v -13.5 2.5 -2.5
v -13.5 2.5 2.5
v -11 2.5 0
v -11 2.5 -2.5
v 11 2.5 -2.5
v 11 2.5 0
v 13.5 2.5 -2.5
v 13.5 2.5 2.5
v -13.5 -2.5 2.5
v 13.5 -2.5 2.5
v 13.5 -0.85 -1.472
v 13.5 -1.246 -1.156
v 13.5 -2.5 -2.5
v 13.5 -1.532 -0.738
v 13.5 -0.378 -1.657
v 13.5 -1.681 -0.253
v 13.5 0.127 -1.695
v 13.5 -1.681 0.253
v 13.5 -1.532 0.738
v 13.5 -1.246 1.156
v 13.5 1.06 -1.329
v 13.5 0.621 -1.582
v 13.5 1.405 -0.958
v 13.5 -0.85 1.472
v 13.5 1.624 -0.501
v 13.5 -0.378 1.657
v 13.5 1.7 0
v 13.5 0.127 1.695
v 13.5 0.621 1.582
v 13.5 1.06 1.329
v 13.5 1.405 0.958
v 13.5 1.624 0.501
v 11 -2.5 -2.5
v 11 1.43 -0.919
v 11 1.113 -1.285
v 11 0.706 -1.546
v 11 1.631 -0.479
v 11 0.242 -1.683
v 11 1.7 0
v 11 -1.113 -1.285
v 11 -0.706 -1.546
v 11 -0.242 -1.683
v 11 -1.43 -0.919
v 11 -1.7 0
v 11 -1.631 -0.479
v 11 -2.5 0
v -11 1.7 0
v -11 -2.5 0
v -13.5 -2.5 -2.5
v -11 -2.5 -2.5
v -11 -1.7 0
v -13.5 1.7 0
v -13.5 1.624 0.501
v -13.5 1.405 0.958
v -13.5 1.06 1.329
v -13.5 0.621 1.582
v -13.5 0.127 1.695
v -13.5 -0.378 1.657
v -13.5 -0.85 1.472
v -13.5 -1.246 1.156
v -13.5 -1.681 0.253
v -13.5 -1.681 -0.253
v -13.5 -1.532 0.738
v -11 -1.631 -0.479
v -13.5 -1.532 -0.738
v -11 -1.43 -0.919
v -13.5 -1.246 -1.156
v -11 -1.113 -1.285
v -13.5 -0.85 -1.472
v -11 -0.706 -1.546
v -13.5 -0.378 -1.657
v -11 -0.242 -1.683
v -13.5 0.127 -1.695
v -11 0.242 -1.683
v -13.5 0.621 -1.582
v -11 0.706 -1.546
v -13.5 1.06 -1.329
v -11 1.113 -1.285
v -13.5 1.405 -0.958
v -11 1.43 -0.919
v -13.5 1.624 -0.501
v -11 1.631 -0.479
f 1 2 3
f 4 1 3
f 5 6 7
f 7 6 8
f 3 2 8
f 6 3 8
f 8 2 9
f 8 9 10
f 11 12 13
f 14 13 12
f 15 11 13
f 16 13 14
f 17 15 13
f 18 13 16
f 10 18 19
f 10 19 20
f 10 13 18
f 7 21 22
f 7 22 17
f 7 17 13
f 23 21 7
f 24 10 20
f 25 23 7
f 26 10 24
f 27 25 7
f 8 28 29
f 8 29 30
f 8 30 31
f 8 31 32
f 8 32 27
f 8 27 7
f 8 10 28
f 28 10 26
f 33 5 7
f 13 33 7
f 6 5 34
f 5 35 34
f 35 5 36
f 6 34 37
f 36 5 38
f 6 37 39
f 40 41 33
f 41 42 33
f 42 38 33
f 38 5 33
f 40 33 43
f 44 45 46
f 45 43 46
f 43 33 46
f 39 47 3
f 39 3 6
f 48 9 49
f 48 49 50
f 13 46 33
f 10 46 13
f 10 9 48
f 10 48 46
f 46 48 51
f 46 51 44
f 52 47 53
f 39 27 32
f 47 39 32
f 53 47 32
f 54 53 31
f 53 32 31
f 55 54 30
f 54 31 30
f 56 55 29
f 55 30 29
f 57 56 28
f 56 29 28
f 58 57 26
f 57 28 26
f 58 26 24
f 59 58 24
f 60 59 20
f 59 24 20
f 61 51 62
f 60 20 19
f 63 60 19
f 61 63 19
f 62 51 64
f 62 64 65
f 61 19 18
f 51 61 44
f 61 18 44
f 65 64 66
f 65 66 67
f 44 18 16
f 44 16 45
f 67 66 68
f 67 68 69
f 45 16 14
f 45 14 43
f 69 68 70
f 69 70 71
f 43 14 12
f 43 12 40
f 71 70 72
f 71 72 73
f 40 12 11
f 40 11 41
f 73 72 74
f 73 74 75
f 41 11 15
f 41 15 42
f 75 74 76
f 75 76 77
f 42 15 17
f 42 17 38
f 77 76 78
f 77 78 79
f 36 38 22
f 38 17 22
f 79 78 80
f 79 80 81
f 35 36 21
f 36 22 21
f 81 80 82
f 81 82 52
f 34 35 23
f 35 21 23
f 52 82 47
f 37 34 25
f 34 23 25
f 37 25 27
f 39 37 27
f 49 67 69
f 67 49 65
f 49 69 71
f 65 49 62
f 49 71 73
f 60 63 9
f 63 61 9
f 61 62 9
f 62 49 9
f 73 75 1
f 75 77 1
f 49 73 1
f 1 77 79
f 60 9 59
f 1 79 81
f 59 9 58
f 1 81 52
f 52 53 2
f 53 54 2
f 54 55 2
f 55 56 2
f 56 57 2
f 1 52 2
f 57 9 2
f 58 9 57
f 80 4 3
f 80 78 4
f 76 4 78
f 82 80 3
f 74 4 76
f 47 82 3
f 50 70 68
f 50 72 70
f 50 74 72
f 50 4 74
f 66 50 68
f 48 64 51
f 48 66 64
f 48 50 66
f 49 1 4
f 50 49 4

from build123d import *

# Parameters (mm, degrees)
SKETCH_W          = 27
SKETCH_H          = 5
PAD_DEPTH         = 2.5
SKETCH001_R       = 1.7
POCKET_DEPTH      = 13.501
POCKET_DEPTH_BACK = -13.501
SKETCH002_W       = 22
SKETCH002_H       = 3
POCKET001_DEPTH   = 2.5


with BuildPart() as part:
    # Sketch → Pad (new body, symmetric)
    with BuildSketch(Plane.XY):
        Rectangle(SKETCH_W, SKETCH_H)
    extrude(amount=PAD_DEPTH, both=True)

    # Sketch001 → Pocket (cut, two sides)
    with BuildSketch(Plane.YZ) as pocket_sk:
        Circle(SKETCH001_R)
    extrude(amount=-POCKET_DEPTH, mode=Mode.SUBTRACT)
    extrude(pocket_sk.sketch, amount=-POCKET_DEPTH_BACK, mode=Mode.SUBTRACT)

    # Sketch002 → Pocket001 (cut, symmetric)
    with BuildSketch(Plane.XZ):
        with Locations((0, -1.5)):
            Rectangle(SKETCH002_W, SKETCH002_H)
    extrude(amount=POCKET001_DEPTH, both=True, mode=Mode.SUBTRACT)


solid = part.part
